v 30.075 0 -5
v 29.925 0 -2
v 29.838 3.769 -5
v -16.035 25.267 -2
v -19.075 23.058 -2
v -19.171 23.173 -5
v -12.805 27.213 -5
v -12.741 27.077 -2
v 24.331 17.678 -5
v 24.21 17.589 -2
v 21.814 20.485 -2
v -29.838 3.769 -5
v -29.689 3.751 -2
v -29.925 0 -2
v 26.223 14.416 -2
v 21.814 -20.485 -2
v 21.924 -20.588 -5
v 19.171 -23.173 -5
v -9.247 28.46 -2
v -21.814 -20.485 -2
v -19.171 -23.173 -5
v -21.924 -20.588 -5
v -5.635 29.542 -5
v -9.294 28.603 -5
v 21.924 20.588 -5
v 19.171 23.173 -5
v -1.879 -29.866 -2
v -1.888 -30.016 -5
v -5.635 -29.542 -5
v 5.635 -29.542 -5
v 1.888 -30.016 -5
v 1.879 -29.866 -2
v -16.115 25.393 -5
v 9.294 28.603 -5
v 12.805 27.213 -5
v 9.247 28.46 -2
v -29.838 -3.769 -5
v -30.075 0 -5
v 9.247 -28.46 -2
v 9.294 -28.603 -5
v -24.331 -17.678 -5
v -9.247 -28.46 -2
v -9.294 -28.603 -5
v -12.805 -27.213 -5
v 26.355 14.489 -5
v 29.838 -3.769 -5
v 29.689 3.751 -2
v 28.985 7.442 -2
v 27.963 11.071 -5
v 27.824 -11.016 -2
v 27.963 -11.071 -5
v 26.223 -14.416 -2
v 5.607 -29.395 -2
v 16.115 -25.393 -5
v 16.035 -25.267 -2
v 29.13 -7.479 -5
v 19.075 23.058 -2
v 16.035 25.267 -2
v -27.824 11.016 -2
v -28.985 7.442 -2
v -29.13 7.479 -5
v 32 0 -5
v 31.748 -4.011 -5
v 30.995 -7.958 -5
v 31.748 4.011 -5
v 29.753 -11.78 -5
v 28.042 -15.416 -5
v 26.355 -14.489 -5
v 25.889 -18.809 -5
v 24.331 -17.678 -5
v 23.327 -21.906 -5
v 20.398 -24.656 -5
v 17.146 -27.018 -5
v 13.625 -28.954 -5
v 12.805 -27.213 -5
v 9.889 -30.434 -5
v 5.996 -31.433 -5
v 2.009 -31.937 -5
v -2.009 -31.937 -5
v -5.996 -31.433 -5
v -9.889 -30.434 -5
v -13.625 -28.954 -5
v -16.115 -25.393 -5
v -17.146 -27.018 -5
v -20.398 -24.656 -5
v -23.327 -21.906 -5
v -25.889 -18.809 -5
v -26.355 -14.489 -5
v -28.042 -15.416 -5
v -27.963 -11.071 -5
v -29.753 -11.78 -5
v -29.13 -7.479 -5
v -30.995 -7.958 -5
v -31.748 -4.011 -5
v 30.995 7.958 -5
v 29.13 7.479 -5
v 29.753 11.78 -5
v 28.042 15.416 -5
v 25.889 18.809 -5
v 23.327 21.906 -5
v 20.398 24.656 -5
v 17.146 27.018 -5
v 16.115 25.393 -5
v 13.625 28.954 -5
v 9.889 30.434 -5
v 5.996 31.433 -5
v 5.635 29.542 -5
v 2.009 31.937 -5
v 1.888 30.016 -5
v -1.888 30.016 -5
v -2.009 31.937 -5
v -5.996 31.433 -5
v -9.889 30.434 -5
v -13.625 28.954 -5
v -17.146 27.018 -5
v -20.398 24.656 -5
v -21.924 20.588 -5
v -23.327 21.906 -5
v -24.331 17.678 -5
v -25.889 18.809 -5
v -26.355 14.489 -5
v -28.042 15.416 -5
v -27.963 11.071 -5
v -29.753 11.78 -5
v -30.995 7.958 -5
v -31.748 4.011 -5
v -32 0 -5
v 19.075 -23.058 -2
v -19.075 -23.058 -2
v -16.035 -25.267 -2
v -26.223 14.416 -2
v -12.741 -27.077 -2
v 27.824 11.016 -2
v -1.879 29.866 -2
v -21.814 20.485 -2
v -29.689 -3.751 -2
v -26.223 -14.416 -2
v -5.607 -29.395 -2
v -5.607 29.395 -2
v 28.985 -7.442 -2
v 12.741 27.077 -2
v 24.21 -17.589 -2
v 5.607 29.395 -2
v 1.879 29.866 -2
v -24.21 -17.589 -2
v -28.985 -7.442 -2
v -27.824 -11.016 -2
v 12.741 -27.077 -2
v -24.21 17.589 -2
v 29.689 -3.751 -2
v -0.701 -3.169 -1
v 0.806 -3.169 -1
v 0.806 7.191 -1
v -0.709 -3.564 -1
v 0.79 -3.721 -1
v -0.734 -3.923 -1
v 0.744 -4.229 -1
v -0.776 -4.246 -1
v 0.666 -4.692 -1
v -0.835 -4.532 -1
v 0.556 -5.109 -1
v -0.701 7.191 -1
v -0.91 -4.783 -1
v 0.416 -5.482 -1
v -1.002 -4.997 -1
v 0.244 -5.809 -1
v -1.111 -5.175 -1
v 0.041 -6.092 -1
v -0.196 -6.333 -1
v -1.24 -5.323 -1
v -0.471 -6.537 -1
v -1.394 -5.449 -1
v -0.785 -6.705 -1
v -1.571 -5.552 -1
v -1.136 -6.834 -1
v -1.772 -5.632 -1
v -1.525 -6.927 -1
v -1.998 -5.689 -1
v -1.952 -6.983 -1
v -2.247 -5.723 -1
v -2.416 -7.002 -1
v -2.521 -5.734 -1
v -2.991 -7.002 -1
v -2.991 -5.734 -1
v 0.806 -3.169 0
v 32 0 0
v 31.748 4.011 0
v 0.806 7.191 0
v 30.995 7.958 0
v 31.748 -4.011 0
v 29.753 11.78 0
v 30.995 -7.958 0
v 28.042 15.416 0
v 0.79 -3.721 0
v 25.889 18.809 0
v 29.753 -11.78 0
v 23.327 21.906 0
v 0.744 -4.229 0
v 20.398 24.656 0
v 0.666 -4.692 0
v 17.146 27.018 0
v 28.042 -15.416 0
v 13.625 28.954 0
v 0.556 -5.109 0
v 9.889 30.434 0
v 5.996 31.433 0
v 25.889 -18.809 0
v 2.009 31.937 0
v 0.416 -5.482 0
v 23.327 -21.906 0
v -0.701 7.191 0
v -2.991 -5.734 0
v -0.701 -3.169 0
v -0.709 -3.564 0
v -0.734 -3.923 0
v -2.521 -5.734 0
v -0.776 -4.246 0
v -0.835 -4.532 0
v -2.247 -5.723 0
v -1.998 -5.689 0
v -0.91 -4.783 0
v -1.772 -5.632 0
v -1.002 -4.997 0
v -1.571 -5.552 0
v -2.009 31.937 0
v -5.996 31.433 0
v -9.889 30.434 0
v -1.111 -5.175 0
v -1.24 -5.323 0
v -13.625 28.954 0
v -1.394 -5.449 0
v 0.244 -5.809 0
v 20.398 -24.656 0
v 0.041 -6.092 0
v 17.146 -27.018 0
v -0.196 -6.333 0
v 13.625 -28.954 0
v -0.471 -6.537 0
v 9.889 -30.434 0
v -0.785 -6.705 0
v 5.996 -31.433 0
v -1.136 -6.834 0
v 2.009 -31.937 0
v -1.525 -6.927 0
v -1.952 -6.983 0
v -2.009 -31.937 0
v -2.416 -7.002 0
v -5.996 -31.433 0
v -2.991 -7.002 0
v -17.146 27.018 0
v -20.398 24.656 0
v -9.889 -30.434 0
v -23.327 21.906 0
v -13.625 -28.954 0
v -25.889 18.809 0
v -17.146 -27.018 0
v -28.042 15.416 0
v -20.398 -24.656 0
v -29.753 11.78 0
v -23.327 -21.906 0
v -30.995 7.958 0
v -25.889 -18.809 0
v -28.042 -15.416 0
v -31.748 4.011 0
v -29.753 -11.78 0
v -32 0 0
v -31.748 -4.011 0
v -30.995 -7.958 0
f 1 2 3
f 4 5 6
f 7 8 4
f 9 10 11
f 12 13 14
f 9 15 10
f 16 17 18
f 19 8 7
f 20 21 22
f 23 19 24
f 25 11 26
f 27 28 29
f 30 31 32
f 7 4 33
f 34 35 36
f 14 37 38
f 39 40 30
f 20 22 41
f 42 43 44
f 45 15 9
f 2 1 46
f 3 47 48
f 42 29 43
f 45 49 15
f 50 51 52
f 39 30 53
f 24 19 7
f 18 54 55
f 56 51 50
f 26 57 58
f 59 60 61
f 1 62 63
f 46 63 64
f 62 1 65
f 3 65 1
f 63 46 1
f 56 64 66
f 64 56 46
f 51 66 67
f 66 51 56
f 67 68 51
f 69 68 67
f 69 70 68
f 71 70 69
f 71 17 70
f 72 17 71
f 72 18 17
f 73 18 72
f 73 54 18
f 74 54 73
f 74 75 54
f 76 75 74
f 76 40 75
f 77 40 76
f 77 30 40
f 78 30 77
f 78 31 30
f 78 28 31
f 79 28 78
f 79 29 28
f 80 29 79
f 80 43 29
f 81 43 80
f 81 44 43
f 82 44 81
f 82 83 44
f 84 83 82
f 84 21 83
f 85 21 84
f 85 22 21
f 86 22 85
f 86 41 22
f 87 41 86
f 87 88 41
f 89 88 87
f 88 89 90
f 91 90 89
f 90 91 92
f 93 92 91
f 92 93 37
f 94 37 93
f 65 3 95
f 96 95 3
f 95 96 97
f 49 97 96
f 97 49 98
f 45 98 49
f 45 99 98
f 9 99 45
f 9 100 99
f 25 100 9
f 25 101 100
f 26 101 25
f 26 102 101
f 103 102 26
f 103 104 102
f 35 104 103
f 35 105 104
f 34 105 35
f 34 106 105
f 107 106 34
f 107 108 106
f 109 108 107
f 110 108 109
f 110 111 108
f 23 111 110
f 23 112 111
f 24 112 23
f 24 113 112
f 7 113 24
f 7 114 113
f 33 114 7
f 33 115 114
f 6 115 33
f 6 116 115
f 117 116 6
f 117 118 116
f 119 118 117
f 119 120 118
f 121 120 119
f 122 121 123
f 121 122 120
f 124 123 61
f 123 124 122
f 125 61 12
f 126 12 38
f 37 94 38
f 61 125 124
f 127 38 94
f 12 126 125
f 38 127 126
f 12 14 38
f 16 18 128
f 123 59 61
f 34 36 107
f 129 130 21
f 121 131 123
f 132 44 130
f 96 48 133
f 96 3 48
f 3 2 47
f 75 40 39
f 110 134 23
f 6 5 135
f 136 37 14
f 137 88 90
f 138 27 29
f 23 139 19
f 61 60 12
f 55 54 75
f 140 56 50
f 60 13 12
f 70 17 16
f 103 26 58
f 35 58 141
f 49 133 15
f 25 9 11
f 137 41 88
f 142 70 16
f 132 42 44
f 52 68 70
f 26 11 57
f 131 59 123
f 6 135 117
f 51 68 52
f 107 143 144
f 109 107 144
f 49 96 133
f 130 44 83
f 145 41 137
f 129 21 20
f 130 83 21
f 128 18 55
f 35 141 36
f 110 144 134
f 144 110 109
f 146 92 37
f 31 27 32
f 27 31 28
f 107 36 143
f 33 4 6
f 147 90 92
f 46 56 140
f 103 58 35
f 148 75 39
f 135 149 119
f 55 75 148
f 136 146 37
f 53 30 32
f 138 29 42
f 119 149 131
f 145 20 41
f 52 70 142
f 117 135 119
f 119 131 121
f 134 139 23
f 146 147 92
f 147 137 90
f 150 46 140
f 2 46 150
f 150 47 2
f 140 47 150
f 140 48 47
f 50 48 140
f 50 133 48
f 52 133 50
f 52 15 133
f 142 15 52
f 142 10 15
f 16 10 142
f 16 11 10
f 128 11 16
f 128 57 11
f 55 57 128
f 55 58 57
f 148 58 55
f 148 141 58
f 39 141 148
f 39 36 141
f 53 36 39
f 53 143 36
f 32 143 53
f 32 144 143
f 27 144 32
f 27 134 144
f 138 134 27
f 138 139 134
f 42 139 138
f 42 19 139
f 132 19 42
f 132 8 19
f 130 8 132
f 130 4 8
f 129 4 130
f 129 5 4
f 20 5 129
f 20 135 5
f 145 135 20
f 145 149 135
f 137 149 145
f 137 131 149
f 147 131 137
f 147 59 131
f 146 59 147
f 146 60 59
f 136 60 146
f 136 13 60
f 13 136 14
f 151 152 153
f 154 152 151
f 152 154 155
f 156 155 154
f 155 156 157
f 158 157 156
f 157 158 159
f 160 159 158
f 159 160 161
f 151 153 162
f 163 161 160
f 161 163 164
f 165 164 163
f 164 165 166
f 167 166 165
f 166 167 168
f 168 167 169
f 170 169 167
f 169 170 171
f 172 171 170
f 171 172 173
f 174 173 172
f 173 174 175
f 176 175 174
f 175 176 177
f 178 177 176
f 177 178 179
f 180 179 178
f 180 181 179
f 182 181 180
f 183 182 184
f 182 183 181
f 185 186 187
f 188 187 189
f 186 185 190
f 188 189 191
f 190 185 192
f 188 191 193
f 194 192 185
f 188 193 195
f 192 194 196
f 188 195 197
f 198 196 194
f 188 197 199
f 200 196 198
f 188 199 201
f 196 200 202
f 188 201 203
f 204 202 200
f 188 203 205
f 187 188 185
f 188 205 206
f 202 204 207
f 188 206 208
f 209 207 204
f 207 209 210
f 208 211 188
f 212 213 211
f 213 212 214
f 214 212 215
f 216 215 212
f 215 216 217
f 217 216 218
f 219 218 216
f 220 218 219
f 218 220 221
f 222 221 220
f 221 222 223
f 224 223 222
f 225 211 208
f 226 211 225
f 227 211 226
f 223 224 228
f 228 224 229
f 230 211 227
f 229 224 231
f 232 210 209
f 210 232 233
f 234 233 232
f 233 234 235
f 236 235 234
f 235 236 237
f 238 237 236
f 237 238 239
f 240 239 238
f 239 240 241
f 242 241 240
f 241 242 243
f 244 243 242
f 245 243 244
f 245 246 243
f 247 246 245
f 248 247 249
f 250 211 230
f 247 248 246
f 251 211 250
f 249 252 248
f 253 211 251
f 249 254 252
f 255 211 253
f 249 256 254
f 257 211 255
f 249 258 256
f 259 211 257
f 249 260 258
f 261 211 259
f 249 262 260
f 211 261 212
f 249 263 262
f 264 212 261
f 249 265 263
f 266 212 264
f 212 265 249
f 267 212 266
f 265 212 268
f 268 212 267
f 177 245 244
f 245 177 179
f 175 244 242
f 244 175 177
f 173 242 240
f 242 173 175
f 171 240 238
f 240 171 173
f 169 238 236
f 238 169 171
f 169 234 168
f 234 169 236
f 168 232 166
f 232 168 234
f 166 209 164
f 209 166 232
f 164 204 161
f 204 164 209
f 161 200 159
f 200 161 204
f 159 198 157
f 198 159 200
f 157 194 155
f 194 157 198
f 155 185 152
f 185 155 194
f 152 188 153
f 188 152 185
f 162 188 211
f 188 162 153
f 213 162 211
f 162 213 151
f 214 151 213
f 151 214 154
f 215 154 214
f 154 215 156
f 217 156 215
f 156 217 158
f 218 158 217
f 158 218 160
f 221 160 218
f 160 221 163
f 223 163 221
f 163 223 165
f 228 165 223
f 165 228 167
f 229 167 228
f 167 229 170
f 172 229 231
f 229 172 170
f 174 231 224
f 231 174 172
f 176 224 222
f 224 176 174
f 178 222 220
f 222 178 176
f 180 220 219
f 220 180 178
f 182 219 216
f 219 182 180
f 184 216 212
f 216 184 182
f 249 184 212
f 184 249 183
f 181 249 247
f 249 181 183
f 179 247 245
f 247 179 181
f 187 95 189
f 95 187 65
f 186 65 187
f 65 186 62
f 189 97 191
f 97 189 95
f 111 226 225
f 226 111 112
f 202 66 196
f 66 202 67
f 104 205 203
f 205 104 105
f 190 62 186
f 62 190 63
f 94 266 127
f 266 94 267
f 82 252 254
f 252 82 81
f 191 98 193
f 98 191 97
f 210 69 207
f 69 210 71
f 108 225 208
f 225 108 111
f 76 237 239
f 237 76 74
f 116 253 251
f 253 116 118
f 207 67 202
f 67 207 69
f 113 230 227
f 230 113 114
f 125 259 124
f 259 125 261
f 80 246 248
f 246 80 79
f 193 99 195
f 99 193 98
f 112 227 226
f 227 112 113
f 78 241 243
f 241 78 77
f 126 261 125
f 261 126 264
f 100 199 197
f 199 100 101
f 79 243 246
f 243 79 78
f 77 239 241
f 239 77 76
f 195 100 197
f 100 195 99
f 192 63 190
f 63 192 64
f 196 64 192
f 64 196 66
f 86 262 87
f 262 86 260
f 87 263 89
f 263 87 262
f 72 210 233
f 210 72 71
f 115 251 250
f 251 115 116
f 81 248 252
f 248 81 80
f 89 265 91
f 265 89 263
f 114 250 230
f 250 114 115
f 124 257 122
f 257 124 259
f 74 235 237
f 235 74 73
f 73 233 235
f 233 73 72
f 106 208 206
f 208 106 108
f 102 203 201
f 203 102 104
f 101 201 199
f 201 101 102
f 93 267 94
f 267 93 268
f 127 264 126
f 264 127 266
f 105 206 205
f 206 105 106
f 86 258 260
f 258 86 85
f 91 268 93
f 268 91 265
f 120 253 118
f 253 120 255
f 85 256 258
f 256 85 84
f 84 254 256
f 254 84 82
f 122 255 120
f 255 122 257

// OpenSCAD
$fn = 50;

difference() {
	union() {
		translate(v = [0, 0, -5.0]) {
			cylinder(h = 5, r = 32.0);
		}
	}
	union() {
		#translate(v = [0, 0, -5.0]) {
			cylinder(h = 3, r1 = 30.075, r2 = 29.925);
		}
		translate(v = [0, 0, -1]) {
			linear_extrude(height = 1) {
				text(font = "Wingdings", halign = "center", size = 11, text = "J", valign = "center");
			}
		}
	}
}
